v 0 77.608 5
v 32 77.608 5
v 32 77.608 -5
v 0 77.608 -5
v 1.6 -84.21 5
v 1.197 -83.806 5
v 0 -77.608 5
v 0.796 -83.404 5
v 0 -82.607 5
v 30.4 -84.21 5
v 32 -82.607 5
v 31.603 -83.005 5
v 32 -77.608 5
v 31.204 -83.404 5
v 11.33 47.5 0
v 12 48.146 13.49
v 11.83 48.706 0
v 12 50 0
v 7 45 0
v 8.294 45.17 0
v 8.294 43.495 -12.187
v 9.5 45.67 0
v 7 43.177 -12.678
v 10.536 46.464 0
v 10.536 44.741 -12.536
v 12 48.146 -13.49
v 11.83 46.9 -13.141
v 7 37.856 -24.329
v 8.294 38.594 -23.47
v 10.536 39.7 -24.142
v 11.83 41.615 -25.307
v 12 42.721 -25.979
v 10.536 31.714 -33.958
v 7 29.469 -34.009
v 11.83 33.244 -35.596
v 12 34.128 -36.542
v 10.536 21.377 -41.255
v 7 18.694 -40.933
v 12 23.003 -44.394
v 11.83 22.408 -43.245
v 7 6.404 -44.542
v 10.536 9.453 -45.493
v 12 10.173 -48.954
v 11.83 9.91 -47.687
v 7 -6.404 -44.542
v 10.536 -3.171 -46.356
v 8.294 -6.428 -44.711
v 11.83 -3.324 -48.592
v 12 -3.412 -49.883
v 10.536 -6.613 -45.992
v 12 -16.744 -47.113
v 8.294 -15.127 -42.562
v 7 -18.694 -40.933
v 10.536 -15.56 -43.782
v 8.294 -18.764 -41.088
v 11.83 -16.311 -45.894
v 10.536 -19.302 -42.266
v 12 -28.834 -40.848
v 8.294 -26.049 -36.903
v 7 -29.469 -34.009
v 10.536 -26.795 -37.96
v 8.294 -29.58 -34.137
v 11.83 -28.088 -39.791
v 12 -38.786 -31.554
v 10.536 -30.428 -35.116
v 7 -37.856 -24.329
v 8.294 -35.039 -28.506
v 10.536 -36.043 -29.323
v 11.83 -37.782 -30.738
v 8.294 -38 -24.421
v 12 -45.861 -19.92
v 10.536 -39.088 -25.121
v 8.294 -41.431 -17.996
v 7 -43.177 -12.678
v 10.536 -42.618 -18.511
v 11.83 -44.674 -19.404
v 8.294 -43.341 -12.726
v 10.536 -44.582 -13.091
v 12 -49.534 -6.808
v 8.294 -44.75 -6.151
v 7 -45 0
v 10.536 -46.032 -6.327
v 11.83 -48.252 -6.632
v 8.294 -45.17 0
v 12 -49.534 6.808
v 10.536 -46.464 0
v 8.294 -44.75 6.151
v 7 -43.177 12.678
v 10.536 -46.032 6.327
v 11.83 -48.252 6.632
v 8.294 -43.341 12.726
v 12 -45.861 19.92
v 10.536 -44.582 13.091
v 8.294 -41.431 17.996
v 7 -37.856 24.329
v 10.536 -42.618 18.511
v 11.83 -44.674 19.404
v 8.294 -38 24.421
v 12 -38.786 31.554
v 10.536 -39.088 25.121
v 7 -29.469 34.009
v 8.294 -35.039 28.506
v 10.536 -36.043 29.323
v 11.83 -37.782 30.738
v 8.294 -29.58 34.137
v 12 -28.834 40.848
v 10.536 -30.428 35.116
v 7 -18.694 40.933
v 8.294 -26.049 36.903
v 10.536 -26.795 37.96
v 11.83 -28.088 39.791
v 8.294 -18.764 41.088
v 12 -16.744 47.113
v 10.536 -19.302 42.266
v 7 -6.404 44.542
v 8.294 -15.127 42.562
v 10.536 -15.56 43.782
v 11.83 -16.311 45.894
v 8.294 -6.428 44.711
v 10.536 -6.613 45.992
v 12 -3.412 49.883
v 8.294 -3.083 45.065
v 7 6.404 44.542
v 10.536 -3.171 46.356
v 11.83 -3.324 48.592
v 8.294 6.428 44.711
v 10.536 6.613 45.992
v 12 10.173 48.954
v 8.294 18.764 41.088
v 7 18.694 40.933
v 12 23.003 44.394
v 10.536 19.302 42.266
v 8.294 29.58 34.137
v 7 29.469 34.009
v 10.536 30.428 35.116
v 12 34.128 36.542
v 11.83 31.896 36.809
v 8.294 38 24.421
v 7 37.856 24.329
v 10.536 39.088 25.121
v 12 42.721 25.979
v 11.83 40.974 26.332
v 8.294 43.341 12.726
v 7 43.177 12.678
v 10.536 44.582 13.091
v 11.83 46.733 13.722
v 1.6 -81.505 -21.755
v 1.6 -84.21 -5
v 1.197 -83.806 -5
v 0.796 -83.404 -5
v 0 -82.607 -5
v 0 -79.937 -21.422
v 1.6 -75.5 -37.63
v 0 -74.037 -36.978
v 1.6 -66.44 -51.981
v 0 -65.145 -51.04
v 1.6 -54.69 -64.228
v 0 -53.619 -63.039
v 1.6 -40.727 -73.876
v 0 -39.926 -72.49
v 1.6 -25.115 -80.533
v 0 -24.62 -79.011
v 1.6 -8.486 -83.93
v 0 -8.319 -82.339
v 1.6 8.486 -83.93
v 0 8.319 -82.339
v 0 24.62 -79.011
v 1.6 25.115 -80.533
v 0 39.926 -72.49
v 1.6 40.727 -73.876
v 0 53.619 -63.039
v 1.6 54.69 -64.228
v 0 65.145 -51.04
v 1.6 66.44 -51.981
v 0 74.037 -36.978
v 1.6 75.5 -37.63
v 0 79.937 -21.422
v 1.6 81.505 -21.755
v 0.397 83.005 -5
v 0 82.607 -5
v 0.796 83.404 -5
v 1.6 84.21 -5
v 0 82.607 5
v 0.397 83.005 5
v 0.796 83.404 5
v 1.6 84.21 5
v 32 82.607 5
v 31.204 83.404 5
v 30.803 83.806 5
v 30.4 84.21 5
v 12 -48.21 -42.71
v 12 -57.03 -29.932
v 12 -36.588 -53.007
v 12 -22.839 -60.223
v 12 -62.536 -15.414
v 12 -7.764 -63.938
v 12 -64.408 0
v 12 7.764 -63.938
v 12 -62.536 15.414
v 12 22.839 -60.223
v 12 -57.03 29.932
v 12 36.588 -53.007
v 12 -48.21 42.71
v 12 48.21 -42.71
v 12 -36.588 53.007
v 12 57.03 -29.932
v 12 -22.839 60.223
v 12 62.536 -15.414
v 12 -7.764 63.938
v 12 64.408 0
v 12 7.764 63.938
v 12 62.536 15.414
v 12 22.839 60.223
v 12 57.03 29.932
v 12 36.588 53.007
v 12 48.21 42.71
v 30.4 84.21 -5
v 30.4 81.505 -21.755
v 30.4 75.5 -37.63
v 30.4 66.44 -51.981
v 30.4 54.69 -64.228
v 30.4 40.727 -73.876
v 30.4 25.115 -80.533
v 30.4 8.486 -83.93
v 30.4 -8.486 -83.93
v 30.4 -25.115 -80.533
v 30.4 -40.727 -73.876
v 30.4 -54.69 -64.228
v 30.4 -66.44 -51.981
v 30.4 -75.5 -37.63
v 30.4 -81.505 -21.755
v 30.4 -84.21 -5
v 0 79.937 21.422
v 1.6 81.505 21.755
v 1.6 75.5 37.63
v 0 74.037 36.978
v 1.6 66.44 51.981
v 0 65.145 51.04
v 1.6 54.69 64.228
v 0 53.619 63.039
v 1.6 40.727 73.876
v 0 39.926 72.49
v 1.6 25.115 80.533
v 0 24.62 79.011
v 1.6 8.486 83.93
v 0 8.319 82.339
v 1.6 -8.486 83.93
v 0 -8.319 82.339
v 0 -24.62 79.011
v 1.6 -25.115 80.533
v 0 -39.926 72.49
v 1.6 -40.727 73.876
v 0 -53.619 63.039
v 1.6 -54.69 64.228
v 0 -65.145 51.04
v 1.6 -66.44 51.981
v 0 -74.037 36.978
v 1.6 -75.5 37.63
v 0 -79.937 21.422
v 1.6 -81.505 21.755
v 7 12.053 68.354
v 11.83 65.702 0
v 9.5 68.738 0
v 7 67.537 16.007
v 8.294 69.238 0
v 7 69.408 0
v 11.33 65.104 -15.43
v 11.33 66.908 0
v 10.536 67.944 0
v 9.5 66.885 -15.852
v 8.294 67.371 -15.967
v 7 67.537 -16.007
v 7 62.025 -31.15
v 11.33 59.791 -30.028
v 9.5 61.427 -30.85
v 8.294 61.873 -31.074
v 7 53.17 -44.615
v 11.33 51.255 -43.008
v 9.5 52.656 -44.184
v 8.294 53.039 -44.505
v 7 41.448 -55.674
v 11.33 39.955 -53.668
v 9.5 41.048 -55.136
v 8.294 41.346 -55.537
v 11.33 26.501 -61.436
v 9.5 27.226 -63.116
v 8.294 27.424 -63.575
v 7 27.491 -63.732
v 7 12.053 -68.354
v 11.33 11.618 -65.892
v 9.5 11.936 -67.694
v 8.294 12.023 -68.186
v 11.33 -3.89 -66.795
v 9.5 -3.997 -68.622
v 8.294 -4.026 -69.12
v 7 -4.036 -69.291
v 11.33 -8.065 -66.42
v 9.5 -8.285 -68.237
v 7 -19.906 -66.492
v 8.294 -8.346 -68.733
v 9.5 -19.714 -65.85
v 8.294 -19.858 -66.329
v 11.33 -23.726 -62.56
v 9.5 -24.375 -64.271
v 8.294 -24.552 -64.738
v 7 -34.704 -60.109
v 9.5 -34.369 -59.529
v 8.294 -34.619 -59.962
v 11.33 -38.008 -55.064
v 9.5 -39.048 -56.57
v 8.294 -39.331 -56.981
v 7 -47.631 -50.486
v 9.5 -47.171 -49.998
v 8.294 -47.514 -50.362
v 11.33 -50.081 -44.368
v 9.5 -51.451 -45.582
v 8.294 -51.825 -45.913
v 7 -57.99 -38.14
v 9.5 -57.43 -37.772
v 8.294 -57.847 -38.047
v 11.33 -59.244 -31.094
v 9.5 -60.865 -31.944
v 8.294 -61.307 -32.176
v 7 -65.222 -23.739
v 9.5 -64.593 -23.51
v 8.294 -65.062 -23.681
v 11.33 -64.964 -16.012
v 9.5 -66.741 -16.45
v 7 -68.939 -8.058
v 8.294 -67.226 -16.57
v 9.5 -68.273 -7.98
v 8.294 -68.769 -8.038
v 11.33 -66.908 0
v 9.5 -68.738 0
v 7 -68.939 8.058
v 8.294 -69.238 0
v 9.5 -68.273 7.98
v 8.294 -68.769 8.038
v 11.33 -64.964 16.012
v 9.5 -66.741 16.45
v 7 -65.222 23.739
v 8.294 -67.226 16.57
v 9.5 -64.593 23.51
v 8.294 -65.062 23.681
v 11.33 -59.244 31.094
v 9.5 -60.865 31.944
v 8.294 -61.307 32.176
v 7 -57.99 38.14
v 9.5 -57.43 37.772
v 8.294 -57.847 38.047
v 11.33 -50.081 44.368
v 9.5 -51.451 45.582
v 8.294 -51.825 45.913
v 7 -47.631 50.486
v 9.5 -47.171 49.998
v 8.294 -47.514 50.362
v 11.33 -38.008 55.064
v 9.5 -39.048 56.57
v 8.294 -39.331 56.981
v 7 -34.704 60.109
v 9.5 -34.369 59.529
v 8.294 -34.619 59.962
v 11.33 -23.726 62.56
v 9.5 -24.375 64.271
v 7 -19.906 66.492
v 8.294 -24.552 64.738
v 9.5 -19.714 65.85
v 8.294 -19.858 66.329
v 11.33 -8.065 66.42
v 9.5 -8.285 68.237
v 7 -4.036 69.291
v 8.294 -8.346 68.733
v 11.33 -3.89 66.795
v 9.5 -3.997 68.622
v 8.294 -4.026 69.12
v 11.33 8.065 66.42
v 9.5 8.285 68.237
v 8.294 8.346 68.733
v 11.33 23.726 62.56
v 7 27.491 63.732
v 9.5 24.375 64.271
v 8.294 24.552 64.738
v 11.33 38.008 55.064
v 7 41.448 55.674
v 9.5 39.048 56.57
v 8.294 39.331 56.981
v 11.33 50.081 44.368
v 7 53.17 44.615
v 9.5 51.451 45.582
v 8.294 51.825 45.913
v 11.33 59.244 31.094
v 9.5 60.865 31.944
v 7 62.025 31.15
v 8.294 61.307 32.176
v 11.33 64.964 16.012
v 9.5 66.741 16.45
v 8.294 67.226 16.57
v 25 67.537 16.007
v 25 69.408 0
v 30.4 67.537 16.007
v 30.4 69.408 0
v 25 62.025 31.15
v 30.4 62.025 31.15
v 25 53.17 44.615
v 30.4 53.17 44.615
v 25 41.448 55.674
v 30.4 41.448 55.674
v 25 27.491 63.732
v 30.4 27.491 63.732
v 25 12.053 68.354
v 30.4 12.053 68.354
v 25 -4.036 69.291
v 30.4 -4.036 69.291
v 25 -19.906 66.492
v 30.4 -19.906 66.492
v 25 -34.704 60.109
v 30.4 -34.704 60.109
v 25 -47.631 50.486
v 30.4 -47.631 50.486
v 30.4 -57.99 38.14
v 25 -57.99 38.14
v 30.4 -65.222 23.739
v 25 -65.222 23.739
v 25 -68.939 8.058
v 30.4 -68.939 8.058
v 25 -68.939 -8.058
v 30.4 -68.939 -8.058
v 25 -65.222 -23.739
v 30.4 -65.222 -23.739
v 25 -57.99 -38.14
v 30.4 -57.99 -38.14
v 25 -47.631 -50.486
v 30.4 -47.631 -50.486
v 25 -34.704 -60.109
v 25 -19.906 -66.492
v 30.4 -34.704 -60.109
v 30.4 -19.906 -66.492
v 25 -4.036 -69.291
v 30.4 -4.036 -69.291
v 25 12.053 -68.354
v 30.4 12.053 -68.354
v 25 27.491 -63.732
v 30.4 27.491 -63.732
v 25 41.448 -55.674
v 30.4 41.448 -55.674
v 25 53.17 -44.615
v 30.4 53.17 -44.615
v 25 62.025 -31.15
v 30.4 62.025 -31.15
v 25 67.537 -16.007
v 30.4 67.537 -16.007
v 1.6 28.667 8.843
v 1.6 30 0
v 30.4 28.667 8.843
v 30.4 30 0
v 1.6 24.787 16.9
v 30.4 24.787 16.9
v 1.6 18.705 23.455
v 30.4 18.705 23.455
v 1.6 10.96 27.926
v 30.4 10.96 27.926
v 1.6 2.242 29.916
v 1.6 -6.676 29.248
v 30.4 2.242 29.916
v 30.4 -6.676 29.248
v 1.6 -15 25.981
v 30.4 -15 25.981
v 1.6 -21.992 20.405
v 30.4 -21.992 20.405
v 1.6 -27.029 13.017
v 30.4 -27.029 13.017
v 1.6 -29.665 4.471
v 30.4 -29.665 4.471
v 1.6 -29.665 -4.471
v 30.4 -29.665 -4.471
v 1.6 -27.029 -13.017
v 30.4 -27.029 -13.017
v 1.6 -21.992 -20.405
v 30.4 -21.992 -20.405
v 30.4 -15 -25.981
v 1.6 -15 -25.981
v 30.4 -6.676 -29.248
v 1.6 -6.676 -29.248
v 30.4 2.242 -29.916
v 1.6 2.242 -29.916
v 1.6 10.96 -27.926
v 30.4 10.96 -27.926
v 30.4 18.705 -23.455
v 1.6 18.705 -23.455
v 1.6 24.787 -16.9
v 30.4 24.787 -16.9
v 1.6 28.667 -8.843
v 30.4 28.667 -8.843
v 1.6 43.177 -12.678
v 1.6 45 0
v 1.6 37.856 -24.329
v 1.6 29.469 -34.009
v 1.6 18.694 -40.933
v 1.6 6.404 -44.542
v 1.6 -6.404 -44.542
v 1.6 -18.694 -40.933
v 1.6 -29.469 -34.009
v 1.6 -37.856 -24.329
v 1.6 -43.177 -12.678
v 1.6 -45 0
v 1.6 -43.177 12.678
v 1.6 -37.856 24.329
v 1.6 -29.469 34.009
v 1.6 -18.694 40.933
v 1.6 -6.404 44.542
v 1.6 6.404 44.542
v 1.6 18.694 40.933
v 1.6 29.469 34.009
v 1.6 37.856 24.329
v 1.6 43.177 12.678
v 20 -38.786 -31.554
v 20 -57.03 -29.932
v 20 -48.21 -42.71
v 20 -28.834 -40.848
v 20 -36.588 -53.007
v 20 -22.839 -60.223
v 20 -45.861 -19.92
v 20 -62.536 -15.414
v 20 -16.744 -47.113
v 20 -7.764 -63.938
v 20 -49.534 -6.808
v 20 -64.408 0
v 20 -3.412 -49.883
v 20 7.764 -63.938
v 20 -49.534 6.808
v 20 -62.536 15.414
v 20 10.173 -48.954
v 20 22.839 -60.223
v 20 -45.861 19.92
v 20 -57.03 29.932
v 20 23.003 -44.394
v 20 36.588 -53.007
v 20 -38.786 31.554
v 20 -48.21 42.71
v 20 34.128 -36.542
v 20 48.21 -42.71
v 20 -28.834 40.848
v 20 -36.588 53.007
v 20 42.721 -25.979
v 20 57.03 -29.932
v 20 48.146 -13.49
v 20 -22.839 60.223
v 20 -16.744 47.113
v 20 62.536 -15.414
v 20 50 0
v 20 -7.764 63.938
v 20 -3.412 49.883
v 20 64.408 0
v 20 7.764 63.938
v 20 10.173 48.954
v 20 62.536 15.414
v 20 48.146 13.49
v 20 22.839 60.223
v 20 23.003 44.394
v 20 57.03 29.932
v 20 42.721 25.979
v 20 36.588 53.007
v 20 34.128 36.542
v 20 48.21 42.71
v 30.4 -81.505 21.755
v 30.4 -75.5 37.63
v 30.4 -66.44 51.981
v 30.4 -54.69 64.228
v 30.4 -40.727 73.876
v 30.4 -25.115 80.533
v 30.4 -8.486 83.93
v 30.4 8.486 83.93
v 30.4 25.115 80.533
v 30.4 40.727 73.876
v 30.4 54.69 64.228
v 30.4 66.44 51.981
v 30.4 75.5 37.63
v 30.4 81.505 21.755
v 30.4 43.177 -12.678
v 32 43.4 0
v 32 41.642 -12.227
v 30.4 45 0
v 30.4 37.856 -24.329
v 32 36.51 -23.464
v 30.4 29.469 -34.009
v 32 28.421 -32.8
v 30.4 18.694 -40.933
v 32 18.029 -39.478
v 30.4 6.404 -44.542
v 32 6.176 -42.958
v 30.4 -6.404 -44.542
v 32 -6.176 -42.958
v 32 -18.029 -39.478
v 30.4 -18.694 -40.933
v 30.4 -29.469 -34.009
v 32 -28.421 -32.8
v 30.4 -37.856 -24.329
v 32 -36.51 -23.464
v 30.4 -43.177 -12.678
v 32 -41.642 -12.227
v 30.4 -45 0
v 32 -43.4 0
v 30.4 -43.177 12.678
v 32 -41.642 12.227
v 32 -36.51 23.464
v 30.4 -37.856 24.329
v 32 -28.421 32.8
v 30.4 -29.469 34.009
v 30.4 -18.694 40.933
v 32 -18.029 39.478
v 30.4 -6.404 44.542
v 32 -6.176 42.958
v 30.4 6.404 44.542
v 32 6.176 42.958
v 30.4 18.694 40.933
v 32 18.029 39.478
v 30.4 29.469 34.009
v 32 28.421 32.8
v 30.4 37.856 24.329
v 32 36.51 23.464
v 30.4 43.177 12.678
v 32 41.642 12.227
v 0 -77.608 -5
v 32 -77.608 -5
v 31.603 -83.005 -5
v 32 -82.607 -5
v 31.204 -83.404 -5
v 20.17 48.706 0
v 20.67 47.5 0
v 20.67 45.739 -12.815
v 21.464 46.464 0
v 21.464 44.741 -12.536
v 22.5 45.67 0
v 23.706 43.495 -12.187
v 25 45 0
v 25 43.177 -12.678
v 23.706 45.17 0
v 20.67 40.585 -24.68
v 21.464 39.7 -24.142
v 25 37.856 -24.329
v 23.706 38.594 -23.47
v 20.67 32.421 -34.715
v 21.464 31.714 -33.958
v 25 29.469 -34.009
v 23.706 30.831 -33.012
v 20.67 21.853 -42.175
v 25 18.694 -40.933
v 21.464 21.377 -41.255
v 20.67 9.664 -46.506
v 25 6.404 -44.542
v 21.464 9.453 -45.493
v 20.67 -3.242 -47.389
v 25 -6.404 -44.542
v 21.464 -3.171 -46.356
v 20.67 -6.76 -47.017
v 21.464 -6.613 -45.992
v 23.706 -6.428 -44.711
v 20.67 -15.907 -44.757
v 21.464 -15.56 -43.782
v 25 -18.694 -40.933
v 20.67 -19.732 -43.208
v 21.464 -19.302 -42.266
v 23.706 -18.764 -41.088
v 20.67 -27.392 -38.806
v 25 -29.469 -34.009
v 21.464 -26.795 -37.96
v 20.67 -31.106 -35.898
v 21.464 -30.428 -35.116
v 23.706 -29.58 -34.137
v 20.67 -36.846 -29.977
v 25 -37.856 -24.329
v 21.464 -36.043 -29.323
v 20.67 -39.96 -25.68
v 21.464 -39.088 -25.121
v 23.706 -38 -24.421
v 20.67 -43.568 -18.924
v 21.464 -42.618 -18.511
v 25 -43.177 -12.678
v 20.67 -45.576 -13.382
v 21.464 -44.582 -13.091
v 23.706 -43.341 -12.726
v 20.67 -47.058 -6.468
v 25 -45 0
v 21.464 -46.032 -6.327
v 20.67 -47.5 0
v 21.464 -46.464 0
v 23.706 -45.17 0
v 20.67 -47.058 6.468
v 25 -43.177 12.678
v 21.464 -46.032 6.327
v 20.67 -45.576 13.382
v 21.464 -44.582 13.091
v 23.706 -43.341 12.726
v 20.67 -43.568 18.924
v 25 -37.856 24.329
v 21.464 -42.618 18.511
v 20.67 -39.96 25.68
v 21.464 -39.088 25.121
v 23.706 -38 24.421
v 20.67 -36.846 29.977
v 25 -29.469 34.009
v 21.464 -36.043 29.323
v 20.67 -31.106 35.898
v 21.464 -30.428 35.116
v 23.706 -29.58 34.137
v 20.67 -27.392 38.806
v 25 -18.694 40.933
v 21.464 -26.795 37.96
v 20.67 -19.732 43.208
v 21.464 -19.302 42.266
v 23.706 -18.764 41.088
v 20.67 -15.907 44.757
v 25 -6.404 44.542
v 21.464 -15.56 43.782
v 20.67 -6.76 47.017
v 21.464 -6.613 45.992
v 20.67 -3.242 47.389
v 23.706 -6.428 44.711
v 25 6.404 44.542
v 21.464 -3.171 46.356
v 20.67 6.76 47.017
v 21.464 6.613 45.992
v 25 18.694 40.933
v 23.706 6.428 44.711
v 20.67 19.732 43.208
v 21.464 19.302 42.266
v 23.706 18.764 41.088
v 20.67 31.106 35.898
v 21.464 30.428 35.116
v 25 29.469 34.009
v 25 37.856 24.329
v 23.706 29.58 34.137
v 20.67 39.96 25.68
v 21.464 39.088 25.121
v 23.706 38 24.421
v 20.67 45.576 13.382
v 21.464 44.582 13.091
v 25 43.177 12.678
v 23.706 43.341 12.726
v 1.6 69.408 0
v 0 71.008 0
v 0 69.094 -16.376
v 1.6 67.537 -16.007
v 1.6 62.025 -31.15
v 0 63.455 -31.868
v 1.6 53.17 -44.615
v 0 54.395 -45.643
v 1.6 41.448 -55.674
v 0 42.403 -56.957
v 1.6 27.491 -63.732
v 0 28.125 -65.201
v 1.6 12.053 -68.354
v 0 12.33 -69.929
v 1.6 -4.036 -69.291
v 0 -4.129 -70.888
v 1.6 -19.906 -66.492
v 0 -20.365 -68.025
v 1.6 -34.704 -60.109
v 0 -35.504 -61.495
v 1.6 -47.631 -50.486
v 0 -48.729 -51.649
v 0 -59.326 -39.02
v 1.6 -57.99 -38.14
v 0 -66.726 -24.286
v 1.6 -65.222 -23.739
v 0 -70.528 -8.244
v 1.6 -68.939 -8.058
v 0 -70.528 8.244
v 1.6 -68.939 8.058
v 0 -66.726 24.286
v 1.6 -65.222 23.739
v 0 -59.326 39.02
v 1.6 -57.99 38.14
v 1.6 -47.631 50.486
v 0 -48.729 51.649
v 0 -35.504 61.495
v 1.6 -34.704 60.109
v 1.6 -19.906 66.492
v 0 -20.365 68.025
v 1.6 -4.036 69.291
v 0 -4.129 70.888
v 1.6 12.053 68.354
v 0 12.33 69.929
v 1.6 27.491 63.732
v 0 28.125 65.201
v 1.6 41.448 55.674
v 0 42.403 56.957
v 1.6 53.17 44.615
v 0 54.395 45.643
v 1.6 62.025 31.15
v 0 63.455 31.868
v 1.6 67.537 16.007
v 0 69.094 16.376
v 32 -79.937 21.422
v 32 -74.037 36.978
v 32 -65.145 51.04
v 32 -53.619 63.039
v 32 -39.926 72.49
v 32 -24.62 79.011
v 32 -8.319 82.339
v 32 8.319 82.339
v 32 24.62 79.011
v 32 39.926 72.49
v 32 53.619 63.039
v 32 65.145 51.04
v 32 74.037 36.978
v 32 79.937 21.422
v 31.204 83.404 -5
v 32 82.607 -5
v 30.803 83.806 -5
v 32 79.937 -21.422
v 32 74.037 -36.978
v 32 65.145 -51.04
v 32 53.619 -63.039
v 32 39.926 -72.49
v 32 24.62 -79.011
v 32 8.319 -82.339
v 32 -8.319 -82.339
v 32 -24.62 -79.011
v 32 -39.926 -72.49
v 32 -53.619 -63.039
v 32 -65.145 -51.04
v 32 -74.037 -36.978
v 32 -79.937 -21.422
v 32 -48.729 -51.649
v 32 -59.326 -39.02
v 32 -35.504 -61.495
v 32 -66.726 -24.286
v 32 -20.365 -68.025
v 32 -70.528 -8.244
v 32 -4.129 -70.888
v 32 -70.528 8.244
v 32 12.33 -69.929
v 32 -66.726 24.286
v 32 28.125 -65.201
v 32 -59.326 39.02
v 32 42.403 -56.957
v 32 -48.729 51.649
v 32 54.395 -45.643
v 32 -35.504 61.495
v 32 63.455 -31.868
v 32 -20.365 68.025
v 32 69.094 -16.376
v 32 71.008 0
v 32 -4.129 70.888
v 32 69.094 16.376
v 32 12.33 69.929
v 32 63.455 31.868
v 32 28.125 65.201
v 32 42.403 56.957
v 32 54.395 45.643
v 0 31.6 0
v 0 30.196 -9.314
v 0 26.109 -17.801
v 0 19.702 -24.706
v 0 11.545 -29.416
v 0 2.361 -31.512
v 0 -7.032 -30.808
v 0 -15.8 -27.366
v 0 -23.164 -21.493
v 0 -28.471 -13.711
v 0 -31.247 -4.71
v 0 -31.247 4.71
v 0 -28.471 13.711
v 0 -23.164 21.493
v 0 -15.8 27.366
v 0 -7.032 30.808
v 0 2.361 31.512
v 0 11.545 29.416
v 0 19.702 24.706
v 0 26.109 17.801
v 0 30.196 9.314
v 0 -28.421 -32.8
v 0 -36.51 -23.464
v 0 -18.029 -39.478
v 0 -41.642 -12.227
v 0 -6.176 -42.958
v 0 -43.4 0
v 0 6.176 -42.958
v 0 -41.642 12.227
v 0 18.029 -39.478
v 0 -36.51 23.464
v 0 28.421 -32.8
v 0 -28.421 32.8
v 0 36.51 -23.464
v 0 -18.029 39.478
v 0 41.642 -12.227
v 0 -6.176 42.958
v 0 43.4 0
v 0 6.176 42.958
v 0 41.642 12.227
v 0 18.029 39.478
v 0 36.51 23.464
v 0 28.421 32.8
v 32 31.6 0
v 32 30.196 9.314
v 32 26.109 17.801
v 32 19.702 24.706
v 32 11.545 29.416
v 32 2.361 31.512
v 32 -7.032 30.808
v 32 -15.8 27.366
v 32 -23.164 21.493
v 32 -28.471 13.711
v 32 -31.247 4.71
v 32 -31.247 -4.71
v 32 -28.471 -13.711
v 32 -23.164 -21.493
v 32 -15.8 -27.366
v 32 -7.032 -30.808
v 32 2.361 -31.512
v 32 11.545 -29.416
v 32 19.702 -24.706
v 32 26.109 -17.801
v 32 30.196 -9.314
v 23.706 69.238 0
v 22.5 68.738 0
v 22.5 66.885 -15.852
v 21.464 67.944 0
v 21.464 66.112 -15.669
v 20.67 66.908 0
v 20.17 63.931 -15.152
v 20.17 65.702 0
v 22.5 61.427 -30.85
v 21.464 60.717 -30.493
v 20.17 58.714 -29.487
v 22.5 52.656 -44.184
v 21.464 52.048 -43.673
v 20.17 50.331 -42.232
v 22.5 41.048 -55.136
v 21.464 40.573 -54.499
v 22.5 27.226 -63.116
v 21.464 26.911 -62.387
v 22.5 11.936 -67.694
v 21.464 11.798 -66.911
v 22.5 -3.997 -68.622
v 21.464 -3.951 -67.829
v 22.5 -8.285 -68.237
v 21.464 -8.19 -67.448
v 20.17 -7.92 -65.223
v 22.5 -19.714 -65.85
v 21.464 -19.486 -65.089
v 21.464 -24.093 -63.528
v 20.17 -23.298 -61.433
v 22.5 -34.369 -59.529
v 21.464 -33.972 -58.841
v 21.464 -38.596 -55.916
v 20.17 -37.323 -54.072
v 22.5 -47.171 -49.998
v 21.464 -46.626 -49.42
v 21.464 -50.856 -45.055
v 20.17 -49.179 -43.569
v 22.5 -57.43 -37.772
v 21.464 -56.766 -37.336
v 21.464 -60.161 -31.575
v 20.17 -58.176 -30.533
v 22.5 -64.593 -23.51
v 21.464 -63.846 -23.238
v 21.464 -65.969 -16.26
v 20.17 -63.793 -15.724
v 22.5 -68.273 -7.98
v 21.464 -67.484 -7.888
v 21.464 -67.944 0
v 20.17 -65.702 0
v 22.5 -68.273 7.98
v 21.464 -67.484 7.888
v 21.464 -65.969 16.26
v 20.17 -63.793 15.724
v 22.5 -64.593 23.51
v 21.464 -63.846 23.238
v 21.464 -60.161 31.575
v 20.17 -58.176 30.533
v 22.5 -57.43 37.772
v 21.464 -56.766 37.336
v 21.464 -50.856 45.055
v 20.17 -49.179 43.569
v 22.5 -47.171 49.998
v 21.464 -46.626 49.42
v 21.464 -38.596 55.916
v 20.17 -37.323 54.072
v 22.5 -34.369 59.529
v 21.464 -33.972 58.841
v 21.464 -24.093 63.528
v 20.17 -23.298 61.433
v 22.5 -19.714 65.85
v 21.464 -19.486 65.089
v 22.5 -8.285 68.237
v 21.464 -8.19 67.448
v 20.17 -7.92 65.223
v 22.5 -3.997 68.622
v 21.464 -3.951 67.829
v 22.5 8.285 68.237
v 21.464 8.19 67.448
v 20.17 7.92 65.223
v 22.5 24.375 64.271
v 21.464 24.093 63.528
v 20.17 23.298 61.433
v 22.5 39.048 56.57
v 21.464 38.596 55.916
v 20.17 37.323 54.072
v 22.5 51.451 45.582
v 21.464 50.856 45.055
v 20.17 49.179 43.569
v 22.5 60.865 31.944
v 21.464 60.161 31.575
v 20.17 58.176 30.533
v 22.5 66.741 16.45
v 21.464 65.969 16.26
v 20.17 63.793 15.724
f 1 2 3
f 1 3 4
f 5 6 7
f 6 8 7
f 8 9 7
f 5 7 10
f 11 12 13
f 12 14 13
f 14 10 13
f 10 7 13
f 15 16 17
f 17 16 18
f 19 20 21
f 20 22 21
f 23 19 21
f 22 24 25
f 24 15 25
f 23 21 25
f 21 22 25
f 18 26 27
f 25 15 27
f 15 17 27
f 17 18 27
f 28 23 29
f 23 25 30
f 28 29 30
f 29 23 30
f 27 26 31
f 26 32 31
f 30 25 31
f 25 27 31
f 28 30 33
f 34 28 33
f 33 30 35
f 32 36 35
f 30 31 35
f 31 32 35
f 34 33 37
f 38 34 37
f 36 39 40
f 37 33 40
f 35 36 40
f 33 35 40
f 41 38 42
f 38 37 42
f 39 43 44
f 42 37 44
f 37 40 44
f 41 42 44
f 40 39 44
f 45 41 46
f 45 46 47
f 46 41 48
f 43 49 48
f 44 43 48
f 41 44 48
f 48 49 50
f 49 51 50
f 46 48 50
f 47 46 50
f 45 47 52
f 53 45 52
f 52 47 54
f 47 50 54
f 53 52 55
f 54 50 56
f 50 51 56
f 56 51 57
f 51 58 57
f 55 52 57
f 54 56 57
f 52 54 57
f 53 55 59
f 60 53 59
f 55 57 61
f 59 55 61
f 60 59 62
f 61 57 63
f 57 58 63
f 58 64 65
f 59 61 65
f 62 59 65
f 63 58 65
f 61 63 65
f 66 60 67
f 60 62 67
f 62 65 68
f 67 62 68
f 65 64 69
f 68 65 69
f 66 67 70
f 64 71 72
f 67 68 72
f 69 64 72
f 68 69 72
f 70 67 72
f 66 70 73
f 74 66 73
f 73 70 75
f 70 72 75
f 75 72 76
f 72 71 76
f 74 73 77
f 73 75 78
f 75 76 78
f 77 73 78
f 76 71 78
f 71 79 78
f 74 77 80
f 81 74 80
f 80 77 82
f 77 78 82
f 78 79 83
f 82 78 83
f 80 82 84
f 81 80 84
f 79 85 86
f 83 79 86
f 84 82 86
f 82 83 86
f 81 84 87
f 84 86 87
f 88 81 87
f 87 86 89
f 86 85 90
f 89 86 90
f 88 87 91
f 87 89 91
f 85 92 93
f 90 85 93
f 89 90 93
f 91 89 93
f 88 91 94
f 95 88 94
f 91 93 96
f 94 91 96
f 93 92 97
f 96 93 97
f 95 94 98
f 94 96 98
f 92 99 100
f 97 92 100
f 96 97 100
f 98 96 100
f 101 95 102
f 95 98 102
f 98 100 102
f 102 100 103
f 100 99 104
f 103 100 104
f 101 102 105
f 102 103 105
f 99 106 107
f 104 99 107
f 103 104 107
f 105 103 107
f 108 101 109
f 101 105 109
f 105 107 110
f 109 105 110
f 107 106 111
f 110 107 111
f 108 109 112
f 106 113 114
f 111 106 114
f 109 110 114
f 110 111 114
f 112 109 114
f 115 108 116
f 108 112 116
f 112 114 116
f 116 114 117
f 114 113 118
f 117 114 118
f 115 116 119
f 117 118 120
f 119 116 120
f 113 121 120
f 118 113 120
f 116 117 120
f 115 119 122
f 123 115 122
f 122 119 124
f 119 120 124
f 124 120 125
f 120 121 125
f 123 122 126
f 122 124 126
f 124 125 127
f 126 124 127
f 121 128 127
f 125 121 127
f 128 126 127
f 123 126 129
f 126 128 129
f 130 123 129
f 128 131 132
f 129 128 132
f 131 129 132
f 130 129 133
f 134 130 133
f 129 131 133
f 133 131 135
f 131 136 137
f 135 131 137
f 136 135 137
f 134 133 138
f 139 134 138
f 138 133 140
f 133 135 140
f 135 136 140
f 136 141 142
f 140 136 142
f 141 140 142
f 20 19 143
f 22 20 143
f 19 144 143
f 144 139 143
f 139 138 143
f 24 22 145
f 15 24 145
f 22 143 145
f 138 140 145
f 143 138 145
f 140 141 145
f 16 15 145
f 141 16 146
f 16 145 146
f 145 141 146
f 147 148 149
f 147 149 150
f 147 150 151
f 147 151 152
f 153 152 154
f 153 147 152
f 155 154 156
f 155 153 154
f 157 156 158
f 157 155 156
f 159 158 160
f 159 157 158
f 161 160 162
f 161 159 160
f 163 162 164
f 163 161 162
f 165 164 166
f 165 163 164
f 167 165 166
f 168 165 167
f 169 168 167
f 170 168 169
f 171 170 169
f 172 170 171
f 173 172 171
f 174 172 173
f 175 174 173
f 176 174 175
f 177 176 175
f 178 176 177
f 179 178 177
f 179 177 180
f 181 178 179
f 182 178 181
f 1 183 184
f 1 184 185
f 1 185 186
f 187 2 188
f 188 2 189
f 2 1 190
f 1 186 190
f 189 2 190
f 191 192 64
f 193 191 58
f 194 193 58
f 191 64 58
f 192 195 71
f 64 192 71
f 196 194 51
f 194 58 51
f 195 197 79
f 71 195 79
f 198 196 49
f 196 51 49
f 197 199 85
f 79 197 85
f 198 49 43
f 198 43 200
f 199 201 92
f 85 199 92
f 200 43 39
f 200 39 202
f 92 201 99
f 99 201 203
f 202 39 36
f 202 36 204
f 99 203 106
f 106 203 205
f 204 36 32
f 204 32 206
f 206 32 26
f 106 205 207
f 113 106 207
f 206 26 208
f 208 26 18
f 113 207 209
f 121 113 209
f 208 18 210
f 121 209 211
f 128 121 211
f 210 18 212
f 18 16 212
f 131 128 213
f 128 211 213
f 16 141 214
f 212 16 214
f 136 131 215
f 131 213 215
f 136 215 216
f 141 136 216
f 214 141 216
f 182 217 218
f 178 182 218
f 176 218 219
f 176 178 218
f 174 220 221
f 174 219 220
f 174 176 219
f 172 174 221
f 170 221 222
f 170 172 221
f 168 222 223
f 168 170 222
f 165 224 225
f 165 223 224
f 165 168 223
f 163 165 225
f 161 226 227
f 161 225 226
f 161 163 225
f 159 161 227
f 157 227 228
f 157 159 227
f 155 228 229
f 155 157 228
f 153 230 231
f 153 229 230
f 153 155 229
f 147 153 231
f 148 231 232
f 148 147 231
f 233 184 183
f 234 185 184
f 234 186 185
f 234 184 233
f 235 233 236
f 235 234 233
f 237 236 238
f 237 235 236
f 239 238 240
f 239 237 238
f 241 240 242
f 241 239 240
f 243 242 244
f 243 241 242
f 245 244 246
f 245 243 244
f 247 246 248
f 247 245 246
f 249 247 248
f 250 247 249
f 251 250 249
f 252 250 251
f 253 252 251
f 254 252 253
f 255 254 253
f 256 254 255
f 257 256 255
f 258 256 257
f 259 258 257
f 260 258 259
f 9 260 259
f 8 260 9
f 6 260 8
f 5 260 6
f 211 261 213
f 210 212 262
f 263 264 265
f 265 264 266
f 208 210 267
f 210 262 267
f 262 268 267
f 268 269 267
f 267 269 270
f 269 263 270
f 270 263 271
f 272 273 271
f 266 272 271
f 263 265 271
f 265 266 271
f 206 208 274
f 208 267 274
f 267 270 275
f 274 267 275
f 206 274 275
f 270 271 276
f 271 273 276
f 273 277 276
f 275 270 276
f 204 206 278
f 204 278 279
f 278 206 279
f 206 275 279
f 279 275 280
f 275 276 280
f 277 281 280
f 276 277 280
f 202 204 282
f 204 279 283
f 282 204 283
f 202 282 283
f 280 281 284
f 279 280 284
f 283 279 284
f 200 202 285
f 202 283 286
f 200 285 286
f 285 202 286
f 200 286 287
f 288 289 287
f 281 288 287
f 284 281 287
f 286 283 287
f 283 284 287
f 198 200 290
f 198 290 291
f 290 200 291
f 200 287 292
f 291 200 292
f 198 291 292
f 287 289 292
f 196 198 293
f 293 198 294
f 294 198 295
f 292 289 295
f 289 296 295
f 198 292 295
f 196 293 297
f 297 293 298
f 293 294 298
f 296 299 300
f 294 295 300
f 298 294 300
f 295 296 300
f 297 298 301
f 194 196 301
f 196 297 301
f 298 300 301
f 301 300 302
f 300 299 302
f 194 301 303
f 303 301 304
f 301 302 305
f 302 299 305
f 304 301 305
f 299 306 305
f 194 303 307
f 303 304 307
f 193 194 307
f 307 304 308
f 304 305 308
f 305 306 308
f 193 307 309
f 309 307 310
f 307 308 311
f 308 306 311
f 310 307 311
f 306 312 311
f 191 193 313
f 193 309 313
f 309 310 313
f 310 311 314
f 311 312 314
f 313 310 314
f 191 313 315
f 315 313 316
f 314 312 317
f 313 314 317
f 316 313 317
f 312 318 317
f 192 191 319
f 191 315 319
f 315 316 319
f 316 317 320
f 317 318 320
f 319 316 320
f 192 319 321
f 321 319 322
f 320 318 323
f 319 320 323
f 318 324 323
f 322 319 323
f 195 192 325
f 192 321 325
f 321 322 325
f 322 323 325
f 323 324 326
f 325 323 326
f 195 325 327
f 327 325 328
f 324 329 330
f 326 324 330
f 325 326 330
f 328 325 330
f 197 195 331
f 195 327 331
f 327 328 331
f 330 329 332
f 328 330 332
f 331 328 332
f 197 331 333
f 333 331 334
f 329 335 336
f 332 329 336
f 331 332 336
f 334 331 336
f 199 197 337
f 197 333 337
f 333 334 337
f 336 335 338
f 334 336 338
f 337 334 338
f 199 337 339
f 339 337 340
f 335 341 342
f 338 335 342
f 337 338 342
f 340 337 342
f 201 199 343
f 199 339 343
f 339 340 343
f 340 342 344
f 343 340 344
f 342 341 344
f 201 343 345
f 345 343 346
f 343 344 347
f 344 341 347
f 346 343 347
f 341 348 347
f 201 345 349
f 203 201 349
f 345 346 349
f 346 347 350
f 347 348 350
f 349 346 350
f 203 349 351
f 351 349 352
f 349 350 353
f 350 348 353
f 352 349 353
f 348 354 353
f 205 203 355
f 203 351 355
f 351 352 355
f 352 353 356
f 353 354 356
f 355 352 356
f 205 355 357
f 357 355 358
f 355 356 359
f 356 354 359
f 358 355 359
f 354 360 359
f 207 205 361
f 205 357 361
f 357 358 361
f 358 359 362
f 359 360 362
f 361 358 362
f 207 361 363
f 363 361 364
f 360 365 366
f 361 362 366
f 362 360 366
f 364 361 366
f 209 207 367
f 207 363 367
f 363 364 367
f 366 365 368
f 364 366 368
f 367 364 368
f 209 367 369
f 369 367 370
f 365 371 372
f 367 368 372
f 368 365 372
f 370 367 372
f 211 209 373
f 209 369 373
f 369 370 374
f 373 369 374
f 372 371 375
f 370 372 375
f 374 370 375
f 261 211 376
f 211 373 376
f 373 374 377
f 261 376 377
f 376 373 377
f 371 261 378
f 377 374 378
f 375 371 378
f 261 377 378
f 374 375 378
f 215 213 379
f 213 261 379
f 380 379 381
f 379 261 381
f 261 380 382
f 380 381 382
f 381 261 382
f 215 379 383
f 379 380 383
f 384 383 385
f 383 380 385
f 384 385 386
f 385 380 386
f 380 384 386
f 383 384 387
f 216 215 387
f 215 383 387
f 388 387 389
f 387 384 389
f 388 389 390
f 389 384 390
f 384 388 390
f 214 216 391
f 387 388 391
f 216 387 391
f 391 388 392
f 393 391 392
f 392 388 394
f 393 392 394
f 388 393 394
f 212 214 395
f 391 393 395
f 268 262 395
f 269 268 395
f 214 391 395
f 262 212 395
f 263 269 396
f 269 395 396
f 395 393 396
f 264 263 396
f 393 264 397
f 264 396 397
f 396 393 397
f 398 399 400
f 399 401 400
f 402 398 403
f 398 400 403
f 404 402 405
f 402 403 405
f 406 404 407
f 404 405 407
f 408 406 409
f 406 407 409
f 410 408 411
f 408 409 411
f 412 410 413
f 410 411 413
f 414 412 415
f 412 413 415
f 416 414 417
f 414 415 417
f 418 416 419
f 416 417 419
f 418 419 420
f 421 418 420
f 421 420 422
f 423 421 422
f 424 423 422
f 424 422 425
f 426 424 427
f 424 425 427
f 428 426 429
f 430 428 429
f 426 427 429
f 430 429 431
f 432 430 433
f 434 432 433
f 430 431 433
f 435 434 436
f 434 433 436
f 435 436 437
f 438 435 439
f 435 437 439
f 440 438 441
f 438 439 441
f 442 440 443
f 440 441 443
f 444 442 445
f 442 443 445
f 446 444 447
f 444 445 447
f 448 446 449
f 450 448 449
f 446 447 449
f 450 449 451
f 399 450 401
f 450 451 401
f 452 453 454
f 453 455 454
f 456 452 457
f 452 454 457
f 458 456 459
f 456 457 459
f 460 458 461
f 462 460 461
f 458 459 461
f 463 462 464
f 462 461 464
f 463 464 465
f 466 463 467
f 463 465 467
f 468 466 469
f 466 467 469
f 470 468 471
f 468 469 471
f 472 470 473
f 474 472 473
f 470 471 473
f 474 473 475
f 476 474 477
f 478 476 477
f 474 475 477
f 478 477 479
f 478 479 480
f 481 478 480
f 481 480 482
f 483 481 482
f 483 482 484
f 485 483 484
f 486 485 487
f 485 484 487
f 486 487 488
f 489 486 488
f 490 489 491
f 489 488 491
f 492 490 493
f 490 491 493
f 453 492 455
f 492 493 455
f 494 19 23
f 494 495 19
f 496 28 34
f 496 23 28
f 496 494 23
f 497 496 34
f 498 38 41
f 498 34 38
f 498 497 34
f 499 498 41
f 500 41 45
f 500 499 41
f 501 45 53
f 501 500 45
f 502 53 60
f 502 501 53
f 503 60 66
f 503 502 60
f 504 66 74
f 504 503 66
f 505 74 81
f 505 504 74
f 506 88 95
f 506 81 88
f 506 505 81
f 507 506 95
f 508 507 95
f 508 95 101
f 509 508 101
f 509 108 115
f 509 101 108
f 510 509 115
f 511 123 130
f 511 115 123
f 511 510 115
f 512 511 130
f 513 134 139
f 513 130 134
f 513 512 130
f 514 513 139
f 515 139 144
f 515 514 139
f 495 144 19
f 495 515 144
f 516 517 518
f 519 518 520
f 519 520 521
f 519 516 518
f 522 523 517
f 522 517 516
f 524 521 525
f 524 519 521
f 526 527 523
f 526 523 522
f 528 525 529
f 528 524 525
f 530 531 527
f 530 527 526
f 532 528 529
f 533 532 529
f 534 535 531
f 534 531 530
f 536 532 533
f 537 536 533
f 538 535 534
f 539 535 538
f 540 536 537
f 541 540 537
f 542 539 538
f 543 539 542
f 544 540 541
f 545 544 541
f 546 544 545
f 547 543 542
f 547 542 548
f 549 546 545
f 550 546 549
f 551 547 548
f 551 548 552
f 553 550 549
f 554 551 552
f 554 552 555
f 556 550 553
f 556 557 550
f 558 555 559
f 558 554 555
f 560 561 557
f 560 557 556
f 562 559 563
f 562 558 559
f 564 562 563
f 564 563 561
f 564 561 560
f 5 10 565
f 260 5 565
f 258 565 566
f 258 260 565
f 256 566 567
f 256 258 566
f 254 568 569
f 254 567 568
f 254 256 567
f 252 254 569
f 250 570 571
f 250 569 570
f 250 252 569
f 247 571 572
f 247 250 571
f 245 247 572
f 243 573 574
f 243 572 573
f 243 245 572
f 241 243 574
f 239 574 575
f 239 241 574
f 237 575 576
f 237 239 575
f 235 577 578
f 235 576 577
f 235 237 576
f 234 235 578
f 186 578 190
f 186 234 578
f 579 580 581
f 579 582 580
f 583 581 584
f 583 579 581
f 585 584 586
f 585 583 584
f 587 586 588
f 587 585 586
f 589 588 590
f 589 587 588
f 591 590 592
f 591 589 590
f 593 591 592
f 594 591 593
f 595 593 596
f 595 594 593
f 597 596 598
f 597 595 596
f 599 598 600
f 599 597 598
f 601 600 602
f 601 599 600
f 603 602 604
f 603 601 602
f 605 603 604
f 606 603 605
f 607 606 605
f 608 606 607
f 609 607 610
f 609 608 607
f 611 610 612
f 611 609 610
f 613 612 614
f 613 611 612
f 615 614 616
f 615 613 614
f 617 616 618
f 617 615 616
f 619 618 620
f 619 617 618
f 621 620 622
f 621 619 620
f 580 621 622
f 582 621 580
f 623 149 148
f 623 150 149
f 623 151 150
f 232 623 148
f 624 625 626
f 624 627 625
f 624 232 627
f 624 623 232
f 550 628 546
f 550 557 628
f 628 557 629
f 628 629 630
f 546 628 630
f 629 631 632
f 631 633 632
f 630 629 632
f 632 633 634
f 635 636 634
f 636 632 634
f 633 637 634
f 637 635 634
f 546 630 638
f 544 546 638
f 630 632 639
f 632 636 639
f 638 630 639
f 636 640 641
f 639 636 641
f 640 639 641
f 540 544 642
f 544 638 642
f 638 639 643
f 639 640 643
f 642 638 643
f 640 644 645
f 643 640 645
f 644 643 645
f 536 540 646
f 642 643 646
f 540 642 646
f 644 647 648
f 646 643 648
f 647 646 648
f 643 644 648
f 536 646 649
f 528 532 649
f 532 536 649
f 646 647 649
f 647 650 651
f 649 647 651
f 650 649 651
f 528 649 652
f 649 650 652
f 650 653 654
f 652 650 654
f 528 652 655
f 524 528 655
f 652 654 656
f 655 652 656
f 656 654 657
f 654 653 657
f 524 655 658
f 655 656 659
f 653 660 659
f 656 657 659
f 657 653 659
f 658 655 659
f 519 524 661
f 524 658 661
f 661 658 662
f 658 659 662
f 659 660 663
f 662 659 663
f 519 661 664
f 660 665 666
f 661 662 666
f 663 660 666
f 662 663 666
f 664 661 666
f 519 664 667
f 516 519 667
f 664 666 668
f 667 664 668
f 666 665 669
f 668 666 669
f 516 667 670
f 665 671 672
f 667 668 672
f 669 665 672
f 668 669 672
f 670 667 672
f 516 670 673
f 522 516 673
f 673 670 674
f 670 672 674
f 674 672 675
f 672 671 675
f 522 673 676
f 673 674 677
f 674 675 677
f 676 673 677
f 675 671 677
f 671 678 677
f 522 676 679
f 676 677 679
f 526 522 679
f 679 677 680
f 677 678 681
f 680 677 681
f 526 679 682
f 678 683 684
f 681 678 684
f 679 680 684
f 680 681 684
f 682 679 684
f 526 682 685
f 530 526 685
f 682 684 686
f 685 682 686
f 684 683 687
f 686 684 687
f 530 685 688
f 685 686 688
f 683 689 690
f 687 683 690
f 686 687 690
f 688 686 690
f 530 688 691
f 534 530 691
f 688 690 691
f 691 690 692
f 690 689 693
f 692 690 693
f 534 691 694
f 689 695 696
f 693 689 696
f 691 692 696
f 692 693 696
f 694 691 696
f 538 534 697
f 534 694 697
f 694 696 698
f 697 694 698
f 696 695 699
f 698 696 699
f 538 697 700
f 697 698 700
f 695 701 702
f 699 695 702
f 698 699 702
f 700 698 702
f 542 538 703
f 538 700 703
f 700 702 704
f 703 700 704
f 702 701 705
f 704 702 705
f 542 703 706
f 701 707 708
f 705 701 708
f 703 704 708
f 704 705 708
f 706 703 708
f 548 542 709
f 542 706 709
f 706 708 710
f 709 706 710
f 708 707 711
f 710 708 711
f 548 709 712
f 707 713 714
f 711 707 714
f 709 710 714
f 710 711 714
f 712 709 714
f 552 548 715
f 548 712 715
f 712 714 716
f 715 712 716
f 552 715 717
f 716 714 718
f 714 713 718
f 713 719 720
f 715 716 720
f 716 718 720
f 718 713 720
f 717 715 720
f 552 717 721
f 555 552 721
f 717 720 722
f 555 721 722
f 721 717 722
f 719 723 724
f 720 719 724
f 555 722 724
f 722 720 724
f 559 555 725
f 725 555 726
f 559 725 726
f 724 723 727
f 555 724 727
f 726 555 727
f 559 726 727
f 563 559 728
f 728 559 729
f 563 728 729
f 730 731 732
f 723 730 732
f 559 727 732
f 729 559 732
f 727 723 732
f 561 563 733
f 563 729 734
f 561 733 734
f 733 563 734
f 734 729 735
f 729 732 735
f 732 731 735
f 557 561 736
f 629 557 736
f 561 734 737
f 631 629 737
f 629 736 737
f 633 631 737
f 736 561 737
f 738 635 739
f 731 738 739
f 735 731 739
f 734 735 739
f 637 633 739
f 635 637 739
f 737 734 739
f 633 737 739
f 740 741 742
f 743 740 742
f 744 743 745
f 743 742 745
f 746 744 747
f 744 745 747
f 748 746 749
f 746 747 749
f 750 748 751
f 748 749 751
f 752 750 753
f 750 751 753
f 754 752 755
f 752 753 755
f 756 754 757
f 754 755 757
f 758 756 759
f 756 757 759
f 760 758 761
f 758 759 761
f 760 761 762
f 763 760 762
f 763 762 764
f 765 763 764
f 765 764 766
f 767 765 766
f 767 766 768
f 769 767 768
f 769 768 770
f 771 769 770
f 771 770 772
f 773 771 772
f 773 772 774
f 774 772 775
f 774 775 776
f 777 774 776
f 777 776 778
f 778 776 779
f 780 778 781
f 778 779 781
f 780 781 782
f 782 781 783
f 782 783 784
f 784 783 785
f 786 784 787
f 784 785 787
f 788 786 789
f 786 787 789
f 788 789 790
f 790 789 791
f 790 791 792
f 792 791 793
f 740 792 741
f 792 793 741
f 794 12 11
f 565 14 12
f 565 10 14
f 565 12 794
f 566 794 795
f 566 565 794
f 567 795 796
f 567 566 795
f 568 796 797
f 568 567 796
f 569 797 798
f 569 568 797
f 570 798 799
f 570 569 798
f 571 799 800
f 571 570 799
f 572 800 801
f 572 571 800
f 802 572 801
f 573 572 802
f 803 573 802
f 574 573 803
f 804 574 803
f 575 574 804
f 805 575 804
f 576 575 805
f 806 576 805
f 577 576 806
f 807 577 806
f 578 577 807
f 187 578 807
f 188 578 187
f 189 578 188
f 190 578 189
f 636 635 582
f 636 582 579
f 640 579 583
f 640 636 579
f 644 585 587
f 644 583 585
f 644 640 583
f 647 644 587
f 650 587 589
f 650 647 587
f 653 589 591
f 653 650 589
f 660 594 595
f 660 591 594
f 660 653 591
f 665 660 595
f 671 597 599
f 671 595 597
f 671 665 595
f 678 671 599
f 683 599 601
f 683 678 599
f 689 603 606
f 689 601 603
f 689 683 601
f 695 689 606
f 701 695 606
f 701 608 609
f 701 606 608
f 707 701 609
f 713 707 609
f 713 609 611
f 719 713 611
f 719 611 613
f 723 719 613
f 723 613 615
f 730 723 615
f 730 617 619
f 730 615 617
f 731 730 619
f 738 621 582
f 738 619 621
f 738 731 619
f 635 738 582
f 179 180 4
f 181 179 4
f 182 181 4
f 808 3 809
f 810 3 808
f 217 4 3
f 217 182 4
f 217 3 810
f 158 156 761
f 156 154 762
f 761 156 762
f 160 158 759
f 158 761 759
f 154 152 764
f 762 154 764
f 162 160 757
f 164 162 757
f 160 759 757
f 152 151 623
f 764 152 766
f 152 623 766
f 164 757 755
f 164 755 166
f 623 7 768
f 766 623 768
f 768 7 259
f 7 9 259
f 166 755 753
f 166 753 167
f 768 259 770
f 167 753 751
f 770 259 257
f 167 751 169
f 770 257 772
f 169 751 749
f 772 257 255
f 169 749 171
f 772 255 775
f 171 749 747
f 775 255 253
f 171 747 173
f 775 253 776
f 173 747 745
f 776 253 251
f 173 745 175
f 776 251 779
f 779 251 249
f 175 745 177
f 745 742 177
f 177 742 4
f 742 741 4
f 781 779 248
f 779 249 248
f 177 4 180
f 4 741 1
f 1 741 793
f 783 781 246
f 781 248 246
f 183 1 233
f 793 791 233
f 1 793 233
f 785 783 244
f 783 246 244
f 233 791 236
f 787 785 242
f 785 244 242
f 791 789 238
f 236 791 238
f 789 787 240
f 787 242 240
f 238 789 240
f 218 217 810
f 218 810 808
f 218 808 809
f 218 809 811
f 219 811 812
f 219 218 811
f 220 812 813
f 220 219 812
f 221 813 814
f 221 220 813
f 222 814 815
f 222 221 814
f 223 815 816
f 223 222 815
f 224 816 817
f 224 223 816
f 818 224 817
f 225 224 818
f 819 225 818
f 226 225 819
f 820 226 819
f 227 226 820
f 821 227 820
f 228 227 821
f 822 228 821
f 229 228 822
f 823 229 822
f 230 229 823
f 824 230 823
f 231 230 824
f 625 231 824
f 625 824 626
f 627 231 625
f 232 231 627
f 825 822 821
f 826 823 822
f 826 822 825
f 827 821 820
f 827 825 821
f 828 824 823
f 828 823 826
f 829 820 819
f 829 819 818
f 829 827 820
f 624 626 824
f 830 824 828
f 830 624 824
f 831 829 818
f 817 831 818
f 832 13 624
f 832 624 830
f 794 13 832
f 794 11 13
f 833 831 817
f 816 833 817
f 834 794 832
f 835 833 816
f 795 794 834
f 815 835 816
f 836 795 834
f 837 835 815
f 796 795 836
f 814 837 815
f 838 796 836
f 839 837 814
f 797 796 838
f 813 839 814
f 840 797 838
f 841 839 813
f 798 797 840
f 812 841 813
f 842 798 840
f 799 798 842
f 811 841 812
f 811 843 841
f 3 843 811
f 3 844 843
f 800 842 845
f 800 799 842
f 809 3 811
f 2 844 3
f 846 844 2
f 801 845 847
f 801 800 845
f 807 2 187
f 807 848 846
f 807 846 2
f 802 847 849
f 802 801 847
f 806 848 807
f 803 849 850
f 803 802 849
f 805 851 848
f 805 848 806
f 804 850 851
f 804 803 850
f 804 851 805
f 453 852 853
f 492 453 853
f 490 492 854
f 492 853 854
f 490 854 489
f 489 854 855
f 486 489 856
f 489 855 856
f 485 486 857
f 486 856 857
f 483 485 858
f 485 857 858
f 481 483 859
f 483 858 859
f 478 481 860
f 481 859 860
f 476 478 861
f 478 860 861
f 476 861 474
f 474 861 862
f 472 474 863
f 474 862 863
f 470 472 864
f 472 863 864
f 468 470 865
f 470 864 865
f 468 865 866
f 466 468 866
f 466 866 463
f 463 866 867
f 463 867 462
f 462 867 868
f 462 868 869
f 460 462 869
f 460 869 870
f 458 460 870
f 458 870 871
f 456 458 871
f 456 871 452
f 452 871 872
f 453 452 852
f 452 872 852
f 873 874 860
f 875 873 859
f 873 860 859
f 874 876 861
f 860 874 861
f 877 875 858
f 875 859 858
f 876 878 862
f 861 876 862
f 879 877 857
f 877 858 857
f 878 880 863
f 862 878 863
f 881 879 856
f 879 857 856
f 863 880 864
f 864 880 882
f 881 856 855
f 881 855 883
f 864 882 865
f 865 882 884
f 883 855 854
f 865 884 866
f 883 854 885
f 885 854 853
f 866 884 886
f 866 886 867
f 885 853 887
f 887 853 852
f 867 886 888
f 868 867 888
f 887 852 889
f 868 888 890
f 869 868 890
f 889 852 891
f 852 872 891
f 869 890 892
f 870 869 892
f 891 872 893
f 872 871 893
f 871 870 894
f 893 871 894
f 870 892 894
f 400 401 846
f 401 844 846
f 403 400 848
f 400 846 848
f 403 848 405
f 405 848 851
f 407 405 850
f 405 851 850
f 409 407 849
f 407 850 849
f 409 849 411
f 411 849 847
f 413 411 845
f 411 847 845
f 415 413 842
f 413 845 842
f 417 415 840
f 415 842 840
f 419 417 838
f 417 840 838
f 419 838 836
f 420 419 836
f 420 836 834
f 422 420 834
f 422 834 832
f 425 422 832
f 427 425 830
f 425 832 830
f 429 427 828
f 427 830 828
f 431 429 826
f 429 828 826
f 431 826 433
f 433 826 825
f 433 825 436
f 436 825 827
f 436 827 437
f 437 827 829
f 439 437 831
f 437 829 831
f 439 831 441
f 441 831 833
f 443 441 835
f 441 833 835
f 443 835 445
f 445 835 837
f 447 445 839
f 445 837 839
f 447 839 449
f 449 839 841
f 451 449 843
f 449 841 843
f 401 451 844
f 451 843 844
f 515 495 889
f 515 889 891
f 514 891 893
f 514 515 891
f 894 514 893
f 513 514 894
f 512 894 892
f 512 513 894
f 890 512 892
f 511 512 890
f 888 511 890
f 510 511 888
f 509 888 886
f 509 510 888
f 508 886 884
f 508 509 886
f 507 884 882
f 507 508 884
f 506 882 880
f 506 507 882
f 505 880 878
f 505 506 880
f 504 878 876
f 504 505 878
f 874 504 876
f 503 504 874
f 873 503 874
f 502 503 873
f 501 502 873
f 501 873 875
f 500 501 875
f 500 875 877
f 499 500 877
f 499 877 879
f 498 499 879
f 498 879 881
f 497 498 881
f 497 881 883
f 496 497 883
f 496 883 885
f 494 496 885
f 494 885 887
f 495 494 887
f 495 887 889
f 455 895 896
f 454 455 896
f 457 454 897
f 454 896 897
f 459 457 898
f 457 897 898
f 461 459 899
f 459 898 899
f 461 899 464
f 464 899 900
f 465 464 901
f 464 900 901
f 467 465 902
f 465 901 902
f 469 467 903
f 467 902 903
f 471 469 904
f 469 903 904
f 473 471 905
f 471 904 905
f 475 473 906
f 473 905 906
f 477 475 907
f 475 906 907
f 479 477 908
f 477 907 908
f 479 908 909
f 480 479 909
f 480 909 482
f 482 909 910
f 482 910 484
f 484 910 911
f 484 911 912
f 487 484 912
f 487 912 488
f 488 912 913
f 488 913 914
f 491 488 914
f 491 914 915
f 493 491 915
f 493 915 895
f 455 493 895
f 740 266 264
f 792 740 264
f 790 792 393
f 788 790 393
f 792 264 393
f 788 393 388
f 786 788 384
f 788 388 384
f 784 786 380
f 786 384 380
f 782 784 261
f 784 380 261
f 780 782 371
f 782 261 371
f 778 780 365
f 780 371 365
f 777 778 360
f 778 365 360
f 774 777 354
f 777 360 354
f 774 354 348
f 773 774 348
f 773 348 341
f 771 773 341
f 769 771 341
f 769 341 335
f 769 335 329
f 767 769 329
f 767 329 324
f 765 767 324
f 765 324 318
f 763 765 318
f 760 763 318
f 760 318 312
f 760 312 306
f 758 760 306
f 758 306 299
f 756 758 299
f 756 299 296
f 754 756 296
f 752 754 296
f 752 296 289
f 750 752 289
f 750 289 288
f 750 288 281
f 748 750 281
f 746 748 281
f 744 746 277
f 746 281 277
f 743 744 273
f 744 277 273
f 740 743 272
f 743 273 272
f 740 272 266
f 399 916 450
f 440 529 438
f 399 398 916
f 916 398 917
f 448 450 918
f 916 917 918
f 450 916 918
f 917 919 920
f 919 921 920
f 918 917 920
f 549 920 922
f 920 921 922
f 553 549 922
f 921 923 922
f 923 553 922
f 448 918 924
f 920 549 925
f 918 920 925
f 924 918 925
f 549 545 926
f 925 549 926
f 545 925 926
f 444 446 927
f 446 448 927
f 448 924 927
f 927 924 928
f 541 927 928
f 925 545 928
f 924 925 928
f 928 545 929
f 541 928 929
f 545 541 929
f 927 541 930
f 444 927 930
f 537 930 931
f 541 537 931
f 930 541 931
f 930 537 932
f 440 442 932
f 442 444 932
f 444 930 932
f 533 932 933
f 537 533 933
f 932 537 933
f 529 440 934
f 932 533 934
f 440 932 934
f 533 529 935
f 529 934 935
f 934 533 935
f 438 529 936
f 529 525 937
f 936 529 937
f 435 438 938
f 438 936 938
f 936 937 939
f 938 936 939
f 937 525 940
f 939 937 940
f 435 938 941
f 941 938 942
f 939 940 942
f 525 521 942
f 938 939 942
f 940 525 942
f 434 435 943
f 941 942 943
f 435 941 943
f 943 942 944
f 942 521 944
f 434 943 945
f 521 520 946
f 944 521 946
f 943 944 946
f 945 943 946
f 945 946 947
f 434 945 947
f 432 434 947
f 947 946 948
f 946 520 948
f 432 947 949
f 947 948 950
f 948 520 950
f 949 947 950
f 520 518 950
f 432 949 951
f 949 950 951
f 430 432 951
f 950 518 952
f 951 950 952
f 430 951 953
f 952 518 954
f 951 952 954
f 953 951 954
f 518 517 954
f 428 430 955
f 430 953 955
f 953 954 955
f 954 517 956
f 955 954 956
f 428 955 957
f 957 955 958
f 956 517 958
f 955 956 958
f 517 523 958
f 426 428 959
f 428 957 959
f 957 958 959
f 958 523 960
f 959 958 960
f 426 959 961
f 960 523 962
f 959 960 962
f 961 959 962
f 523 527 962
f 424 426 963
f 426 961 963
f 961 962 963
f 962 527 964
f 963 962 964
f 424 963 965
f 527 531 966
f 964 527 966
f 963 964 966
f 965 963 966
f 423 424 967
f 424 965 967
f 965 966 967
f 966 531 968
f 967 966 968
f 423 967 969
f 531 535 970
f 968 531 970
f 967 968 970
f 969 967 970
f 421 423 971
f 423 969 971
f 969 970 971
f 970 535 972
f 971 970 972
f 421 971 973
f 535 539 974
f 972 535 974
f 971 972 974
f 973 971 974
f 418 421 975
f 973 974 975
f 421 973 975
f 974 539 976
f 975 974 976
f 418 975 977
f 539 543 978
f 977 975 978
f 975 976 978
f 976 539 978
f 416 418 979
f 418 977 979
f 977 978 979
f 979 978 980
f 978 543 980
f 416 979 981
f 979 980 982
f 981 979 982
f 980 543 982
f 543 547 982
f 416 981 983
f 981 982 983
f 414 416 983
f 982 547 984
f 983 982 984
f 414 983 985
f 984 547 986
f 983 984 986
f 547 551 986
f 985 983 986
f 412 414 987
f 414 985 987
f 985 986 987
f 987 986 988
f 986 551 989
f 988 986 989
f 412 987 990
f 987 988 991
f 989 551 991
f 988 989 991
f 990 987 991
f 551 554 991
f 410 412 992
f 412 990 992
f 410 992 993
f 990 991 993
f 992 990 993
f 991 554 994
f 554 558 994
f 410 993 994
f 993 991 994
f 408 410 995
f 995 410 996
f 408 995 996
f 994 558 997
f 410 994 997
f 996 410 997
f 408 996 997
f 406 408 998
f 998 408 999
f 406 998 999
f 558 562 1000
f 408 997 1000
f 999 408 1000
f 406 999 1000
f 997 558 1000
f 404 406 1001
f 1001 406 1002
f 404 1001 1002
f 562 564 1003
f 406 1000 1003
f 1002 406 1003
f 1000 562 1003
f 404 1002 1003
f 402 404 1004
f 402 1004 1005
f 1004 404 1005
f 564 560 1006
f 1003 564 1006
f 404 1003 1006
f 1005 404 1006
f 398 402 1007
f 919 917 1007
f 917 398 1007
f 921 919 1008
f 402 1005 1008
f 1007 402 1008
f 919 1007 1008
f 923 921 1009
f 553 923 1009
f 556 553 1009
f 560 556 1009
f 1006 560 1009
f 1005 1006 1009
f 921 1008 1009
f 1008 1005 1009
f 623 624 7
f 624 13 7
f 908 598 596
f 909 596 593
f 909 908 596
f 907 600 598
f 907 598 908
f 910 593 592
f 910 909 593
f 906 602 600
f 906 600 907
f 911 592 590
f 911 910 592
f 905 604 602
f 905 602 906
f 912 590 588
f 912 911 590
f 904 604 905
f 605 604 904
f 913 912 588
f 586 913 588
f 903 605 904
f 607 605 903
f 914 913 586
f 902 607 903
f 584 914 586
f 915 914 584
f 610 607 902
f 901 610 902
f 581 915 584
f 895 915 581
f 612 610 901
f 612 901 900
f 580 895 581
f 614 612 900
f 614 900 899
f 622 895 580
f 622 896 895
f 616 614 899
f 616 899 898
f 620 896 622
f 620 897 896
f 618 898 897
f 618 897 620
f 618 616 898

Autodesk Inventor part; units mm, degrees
ref_plane "YZ Plane" through (0, 0, 0) normal (1, 0, 0) x (0, 1, 0)
ref_plane "XZ Plane" through (0, 0, 0) normal (0, 1, 0) x (-1, 0, 0)
ref_plane "XY Plane" through (0, 0, 0) normal (0, 0, 1) x (1, 0, 0)
sketch "Эскиз1" plane through (0, 0, 0) normal (0, 0, 1) x (1, 0, 0)
  line L0 (0, 0) -> (28.5418, 0) construction
  line L1 (0, 30) -> (32, 30)
  line L2 (32, 30) -> (32, 45)
  line L3 (32, 45) -> (25, 45)
  line L4 (20, 50) -> (20, 64.408)
  line L5 (25, 69.408) -> (32, 69.408)
  line L6 (32, 69.408) -> (32, 84.358)
  line L7 (32, 84.358) -> (9.7618, 84.358)
  line L8 (9.7618, 84.358) -> (0, 84.358)
  line L9 (0, 84.358) -> (0, 69.408)
  line L10 (0, 69.408) -> (7, 69.408)
  line L11 (12, 64.408) -> (12, 50)
  line L12 (7, 45) -> (0, 45)
  line L13 (0, 45) -> (0, 30)
  arc A0 (7, 45) -> (12, 50) centre (7, 50) ccw
  arc A1 (12, 64.408) -> (7, 69.408) centre (7, 64.408) ccw
  arc A2 (25, 69.408) -> (20, 64.408) centre (25, 64.408) ccw
  arc A3 (20, 50) -> (25, 45) centre (25, 50) ccw
  line L14 (-7.6009, 77.608) -> (48.6633, 77.608)
  point P0 (11, 45)
  point P1 (12, 46)
  point P2 (21, 45)
  point P3 (20, 46)
  point P4 (12, 75.15)
  point P5 (11, 69.408)
  point P6 (21, 69.408)
  point P7 (20, 75.15)
  dimension "d0" = 32
  dimension "d3" = 32
  dimension "d7" = 60
  dimension "d8" = 168.716
  dimension "d11" = 90
  dimension "d13" = 90
  dimension "d15" = 8
  dimension "d16" = 12
  dimension "d23" = 5
  dimension "d24" = 155.216
  dimension "d25" = 8.2
  dimension "d26" = 8.2
revolve "Вращение1" add sketch "Эскиз1" angle 360 about axis through (0, 0, 0) along (1, 0, 0)
chamfer "Фаска1" distance 1.6 angle 45 8 edges at (0, -84.358, 0) (0, -69.408, 0) (32, -84.358, 0) (32, -69.408, 0) (32, -30, 0) (0, -30, 0) (32, -45, 0) (0, -45, 0)
sketch "Эскиз3" plane through (0, 0, 0) normal (0, 0, 1) x (1, 0, 0)
  line L0 (1.6, 84.358) -> (30.4, 84.358) projected
  line L1 (7, 69.408) -> (1.6, 69.408) projected
  line L2 (0, -82.758) -> (0, 82.758) projected
  line L3 (32, 82.758) -> (32, -82.758) projected
  line L4 (1.6, 84.358) -> (37.8818, 84.358)
  line L5 (37.8818, 84.358) -> (37.8818, 77.608)
  line L6 (37.8818, 77.608) -> (1.6, 77.608)
  line L7 (1.6, 77.608) -> (-1.0807, 77.608)
  line L8 (-1.0807, 77.608) -> (-1.0807, 84.358)
  line L9 (-1.0807, 84.358) -> (2.0712, 84.358)
  line L10 (0, 0) -> (69.5045, 0)
  line L11 (1.6, -84.358) -> (30.4, -84.358)
  line L12 (7, -69.408) -> (1.6, -69.408)
  line L13 (1.6, -84.358) -> (37.8818, -84.358)
  line L14 (37.8818, -84.358) -> (37.8818, -77.608)
  line L15 (37.8818, -77.608) -> (1.6, -77.608)
  line L16 (1.6, -77.608) -> (-1.0807, -77.608)
  line L17 (-1.0807, -77.608) -> (-1.0807, -84.358)
  line L18 (-1.0807, -84.358) -> (2.0712, -84.358)
  dimension "d20" = 77.608
extrude "Выдавливание1" cut sketch "Эскиз3" against normal mid plane 10 contours L0 L4 L5 L6 L7 L8 L9 | L16 L15 L14 L13 L11 L18 L17
equation "\"d16\" = -0.5 * d15 + 0.5 * d0"
properties part number "Тихоходное колесо"
